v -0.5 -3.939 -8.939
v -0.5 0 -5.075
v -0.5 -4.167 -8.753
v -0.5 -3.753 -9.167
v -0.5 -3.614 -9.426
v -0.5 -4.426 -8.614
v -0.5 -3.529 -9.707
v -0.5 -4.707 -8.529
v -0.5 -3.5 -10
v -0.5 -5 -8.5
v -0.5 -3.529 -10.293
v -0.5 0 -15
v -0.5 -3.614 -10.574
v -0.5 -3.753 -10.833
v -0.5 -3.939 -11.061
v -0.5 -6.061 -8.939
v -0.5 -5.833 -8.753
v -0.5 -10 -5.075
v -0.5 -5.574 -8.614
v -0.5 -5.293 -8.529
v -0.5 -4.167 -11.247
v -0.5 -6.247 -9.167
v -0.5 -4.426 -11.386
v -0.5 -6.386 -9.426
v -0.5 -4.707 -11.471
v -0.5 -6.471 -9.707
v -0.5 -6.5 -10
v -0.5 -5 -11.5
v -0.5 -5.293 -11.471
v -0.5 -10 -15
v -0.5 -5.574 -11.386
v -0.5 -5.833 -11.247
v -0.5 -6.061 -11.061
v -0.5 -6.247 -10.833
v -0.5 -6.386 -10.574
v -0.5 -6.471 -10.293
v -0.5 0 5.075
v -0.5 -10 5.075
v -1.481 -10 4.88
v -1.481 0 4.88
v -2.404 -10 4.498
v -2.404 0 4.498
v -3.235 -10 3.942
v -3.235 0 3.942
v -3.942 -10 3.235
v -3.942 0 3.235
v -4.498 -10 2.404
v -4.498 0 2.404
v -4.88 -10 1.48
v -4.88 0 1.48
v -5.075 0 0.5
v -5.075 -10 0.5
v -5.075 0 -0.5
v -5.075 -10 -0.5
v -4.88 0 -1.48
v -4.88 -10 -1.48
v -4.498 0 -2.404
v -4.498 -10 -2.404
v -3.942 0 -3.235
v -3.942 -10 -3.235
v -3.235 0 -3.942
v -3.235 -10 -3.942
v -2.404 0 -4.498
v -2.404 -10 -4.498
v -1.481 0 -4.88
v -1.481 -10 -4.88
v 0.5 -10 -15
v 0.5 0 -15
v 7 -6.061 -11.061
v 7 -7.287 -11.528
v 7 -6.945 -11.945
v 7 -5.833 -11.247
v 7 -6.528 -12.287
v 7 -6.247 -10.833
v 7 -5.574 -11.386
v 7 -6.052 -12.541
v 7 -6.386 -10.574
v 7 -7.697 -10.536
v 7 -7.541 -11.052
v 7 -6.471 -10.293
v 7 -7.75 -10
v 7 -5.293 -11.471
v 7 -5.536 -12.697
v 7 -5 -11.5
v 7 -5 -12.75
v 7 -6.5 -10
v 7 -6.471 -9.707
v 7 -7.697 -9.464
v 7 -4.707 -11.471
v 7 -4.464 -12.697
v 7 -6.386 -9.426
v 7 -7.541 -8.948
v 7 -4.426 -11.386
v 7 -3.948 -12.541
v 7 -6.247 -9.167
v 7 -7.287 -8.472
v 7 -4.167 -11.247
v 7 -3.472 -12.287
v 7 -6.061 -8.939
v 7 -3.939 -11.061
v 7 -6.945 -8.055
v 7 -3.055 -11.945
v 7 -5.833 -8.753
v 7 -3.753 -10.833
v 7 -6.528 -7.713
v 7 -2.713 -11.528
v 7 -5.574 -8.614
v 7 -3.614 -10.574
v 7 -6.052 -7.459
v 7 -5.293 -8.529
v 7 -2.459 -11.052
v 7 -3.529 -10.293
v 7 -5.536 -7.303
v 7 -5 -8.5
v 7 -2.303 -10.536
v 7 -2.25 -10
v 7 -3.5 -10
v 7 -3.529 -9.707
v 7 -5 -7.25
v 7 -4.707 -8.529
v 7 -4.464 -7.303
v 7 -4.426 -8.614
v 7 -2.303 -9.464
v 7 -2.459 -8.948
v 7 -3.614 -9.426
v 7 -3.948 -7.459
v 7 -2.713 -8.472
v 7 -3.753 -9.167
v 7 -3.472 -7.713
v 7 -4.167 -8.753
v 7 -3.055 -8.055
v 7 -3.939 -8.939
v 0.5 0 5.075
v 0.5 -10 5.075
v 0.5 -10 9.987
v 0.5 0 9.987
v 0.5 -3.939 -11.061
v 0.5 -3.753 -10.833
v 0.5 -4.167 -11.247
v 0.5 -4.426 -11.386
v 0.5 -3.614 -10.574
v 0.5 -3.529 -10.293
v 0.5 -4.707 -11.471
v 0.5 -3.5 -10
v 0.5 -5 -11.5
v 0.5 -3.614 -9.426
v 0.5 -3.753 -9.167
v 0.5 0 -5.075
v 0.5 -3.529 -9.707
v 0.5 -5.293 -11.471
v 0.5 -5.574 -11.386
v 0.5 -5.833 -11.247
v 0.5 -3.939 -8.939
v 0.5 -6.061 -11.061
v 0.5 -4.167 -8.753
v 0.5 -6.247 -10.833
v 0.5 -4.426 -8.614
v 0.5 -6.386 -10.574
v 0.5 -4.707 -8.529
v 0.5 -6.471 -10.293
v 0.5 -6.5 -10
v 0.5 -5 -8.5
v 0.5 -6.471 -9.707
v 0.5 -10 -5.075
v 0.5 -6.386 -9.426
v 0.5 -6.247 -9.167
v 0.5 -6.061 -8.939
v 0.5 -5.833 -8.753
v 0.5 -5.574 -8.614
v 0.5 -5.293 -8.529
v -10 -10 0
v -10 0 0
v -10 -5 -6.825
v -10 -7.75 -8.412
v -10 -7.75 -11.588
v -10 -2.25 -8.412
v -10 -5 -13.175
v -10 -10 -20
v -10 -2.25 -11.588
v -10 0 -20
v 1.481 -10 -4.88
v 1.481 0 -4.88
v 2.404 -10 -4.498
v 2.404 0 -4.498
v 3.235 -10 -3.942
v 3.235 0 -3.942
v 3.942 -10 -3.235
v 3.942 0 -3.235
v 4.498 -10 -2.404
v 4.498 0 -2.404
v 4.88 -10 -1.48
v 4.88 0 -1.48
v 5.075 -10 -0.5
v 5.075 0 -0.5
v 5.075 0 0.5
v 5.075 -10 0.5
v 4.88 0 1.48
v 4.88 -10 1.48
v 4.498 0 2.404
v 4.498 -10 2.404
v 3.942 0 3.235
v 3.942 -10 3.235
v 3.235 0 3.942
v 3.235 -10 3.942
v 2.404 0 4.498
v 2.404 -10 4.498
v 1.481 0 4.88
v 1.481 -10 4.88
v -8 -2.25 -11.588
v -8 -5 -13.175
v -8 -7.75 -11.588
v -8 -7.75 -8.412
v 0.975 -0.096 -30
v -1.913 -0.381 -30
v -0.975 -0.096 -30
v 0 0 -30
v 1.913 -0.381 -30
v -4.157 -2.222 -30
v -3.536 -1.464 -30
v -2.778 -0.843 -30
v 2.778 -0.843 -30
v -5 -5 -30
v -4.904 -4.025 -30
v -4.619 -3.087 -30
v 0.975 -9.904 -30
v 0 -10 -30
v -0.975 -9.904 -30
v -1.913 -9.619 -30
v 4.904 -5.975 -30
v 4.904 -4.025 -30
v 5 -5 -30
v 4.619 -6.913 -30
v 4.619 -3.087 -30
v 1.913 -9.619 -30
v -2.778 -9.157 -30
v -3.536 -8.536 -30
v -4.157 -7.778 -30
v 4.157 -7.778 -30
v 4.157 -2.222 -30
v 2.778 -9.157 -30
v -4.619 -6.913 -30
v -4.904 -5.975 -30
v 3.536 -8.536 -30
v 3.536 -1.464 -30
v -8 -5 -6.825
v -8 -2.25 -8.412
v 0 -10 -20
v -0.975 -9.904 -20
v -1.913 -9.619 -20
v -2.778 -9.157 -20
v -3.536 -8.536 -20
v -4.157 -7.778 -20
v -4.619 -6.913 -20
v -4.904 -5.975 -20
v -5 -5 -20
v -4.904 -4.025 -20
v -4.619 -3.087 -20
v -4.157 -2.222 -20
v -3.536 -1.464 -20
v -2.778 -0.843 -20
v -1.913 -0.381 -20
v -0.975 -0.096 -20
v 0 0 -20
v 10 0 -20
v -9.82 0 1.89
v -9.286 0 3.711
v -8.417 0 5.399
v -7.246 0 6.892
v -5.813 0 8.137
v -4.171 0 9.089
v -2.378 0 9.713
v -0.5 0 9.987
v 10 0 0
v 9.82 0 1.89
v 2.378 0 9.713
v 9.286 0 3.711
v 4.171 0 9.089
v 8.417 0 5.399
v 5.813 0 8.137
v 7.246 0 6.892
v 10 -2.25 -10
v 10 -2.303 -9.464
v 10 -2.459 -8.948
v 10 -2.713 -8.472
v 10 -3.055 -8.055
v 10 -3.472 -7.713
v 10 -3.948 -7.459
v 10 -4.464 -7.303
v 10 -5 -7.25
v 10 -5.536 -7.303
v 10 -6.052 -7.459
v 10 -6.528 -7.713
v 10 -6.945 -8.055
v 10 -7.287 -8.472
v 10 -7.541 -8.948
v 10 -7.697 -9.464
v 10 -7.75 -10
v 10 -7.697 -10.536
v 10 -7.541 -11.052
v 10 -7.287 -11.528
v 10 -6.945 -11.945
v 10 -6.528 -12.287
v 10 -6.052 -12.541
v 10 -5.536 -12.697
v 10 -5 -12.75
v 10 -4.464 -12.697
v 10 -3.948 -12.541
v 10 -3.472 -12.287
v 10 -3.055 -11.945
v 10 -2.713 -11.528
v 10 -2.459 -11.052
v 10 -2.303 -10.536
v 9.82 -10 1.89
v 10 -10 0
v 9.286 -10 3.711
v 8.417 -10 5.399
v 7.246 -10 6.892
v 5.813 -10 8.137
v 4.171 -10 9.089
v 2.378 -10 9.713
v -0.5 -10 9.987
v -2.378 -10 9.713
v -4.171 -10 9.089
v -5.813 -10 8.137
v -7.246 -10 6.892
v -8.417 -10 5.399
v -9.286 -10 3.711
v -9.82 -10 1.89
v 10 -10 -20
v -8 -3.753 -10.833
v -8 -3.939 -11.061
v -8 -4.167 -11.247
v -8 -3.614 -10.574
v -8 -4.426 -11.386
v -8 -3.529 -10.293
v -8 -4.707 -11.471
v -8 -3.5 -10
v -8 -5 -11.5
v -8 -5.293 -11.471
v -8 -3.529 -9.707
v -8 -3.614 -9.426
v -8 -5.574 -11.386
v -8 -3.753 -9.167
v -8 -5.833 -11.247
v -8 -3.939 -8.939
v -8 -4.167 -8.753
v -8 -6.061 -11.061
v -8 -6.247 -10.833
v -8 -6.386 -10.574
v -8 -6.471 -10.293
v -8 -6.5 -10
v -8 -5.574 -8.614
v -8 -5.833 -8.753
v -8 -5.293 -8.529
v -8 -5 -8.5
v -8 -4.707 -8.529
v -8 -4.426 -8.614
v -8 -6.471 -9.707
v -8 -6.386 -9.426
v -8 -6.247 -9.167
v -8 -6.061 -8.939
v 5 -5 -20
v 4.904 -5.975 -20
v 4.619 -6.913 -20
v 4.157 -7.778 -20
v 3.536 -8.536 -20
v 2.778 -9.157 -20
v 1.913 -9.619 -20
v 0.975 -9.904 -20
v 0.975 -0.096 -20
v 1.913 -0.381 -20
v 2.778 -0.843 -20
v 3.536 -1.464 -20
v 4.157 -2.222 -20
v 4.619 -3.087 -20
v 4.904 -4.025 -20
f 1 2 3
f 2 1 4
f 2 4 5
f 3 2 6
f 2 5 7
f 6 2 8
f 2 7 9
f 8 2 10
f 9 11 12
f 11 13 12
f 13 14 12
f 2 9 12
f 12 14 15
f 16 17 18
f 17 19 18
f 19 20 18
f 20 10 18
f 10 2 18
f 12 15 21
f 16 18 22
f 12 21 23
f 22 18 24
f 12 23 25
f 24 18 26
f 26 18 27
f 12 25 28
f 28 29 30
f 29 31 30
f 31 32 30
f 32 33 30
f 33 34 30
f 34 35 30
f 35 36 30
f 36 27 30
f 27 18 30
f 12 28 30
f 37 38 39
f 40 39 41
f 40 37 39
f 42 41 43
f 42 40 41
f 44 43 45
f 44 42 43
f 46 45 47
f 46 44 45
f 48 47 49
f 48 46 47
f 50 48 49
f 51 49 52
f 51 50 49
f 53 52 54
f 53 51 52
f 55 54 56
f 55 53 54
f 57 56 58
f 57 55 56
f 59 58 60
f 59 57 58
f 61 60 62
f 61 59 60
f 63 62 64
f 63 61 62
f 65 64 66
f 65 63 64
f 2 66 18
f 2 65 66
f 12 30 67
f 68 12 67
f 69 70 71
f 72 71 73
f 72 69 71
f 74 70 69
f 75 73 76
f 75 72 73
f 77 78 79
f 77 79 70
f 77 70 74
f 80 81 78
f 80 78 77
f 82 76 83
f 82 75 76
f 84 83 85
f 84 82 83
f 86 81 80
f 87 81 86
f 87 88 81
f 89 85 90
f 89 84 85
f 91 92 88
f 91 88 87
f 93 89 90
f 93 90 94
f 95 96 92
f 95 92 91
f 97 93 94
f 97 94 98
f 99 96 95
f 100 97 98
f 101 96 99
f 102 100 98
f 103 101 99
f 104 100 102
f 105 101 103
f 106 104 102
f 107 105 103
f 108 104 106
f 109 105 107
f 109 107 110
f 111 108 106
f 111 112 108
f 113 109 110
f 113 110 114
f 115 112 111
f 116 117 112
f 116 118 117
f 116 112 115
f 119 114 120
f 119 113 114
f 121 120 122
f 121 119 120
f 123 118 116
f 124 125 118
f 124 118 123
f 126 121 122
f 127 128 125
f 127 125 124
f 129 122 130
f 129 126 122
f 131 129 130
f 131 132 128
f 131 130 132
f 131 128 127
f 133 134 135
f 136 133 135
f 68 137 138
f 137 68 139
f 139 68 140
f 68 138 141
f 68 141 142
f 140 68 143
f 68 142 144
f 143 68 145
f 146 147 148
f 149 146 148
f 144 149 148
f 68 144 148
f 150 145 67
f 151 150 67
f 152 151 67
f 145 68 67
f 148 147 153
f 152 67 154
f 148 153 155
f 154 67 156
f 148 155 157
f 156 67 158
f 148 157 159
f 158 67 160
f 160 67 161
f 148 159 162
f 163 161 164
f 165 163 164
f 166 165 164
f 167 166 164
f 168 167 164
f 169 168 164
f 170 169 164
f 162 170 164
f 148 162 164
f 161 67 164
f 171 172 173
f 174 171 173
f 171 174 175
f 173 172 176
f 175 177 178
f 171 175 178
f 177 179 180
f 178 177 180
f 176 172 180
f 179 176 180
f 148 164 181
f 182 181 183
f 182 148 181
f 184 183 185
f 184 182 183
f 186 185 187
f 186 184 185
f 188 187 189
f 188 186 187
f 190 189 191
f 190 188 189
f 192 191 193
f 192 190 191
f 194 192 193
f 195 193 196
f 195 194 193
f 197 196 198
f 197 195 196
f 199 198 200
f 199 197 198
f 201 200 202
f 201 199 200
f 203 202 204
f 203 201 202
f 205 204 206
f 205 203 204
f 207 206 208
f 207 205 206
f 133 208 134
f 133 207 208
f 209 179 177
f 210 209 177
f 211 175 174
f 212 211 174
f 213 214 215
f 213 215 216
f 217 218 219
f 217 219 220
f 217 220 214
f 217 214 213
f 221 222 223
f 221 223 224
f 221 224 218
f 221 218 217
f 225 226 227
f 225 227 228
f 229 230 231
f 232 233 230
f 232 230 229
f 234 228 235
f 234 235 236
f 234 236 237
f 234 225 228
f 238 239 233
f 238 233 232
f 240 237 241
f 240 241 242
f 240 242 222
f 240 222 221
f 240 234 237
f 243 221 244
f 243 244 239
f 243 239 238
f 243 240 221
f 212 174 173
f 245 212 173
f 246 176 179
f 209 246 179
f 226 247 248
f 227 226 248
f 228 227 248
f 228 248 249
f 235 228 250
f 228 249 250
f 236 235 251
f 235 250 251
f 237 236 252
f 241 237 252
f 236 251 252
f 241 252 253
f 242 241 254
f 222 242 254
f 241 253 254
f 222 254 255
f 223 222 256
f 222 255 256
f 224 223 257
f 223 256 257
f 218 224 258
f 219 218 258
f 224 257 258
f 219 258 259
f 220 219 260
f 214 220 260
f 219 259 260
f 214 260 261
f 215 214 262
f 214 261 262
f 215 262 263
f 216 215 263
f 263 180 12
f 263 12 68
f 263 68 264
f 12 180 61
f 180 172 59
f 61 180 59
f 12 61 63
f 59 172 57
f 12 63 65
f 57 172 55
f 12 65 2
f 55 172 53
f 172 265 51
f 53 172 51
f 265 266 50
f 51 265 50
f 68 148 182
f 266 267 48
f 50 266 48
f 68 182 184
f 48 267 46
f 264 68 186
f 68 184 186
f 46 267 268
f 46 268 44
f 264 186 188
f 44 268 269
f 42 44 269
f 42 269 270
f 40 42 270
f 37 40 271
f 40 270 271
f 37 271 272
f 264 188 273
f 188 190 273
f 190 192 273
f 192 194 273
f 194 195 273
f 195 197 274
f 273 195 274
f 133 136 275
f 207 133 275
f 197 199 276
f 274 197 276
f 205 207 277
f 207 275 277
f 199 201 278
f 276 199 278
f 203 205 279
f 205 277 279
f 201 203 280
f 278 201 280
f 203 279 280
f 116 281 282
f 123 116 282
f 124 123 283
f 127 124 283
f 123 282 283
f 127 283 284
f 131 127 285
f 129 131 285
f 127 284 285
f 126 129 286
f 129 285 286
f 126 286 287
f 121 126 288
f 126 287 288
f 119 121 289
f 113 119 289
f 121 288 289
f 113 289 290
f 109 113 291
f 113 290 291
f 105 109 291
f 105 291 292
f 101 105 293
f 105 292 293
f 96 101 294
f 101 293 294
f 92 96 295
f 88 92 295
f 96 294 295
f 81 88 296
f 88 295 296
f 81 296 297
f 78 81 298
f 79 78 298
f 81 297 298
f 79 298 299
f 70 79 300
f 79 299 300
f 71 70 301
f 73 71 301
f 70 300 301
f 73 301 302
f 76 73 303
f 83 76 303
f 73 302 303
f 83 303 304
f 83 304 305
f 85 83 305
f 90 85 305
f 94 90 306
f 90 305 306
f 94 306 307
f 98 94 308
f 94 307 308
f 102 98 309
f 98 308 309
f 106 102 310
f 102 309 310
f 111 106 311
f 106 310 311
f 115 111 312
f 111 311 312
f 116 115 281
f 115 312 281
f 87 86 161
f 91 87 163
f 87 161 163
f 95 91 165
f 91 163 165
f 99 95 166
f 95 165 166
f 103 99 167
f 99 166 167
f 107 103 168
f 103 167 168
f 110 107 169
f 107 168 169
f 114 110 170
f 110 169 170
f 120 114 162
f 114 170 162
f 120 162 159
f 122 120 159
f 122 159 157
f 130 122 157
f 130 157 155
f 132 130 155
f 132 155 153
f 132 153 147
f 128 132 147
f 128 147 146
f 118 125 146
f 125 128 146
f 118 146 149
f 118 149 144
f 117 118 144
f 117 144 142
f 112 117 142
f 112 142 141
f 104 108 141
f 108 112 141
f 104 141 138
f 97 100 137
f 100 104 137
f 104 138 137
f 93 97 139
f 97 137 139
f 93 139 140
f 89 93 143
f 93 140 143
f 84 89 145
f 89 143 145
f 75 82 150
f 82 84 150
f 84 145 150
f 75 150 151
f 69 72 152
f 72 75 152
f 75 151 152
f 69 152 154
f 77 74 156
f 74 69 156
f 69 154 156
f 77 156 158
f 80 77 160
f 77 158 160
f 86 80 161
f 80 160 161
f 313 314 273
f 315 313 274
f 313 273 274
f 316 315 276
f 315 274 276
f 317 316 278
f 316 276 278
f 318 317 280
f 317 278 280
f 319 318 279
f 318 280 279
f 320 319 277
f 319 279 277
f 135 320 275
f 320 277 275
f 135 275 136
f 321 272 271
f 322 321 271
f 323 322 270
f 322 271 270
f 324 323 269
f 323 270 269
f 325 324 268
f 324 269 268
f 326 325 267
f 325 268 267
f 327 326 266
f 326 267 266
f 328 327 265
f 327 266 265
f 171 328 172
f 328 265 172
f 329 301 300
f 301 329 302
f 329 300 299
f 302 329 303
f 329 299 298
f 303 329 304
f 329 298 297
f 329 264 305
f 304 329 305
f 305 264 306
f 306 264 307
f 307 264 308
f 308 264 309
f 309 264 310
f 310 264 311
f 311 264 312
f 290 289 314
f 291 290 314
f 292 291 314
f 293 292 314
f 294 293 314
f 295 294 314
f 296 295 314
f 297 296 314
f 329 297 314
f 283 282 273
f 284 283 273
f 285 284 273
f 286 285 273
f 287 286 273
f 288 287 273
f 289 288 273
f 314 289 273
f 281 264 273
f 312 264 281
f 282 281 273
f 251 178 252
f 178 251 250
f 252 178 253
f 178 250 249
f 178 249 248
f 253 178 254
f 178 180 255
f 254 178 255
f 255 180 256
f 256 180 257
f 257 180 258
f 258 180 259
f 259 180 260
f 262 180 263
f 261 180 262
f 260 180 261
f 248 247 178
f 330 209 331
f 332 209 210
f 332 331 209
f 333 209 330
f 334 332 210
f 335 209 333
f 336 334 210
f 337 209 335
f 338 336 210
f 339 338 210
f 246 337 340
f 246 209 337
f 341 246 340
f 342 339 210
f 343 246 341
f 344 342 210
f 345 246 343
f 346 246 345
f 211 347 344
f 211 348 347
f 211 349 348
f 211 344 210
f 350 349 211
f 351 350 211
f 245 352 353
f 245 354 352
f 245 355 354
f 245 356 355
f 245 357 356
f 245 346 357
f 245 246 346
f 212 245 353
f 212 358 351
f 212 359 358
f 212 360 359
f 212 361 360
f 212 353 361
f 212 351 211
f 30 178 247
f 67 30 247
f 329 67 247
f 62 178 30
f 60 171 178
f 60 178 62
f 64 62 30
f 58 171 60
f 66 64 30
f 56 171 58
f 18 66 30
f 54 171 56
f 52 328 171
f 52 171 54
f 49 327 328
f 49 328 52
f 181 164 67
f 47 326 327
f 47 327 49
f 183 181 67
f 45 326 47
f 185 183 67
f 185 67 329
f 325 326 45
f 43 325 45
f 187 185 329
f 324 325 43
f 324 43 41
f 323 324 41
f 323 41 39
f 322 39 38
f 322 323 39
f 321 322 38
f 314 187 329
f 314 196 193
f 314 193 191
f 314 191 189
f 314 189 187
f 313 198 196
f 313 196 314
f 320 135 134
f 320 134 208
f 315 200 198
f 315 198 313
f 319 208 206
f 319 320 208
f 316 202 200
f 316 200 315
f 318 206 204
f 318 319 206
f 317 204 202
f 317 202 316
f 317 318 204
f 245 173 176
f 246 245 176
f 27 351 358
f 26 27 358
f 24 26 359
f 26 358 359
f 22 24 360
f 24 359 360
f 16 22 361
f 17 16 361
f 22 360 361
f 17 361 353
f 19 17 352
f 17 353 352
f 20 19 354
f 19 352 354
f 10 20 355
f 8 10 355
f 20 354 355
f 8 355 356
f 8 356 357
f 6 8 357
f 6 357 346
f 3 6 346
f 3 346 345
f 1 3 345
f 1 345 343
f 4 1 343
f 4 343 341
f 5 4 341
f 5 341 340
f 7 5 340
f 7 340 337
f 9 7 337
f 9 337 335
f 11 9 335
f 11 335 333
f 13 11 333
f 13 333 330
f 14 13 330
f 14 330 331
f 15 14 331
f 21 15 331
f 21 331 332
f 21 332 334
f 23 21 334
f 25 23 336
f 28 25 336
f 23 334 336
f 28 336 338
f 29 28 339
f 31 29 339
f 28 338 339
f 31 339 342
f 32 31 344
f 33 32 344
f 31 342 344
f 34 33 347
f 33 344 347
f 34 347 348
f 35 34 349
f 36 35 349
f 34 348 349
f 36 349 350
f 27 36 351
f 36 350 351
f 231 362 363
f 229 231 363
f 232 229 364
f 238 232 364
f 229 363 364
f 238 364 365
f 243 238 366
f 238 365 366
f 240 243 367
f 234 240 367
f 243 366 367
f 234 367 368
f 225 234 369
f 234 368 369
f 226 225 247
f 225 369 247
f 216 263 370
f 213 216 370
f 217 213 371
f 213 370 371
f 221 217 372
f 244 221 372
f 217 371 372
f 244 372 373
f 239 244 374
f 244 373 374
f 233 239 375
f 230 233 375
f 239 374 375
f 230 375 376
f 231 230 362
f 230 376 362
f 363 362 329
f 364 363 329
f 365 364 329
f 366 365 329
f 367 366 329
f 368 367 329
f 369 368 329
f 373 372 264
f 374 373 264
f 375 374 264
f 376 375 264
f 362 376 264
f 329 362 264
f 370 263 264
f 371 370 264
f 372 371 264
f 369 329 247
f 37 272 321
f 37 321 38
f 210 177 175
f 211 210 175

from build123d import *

# Parameters (mm, degrees)
F0_R      = 5.1
F1_DEPTH  = 10
F2_R      = 1.5
F3_DEPTH  = 25
F5_DEPTH  = 25
F7_DEPTH  = 10
F8_R      = 2.75
F8_R_2    = 1.5
F9_DEPTH  = 3
F10_R     = 1.5
F11_DEPTH = 2


with BuildPart() as f1:
    # F0 (on Front) → F1 (new body)
    with BuildSketch(Plane.XZ):
        with BuildLine():
            ThreePointArc((-10, 0), (0, -10), (10, 0))
            ThreePointArc((10, 0), (0, 10), (-10, 0))
        make_face()
        Circle(F0_R, mode=Mode.SUBTRACT)
        with BuildLine():
            Line((10, -20), (10, 0))
            ThreePointArc((10, 0), (0, -10), (-10, 0))
            Line((-10, 0), (-10, -20))
            Line((-10, -20), (10, -20))
        make_face()
    extrude(amount=F1_DEPTH)

    # F2 (on face) → F3 (cut)
    with BuildSketch(Plane(origin=(-10, 0, 0), x_dir=(0, -1, 0), z_dir=(-1, 0, 0))):
        with Locations((5, -10)):
            Circle(F2_R)
    extrude(amount=-F3_DEPTH, mode=Mode.SUBTRACT)

    # F4 (on face) → F5 (cut)
    with BuildSketch(Plane.XZ.offset(10)):
        with BuildLine():
            Line((0.5, 12.5812012702), (-0.5, 12.5812012702))
            Line((-0.5, 12.5812012702), (-0.5, 9.9874921777))
            ThreePointArc((-0.5, 9.9874921777), (0, 10), (0.5, 9.9874921777))
            Line((0.5, 9.9874921777), (0.5, 12.5812012702))
        make_face()
        with BuildLine():
            ThreePointArc((0.5, 9.9874921777), (0, 10), (-0.5, 9.9874921777))
            Line((-0.5, 9.9874921777), (-0.5, 5.0754310162))
            ThreePointArc((-0.5, 5.0754310162), (0, 5.1), (0.5, 5.0754310162))
            Line((0.5, 5.0754310162), (0.5, 9.9874921777))
        make_face()
        with BuildLine():
            ThreePointArc((0.5, -5.0754310162), (0, -5.1), (-0.5, -5.0754310162))
            Line((-0.5, -5.0754310162), (-0.5, -15))
            Line((-0.5, -15), (0.5, -15))
            Line((0.5, -15), (0.5, -5.0754310162))
        make_face()
        with BuildLine():
            ThreePointArc((0.5, 5.0754310162), (0, 5.1), (-0.5, 5.0754310162))
            Line((-0.5, 5.0754310162), (-0.5, -5.0754310162))
            ThreePointArc((-0.5, -5.0754310162), (0, -5.1), (0.5, -5.0754310162))
            Line((0.5, -5.0754310162), (0.5, 5.0754310162))
        make_face()
    extrude(amount=-F5_DEPTH, mode=Mode.SUBTRACT)

    # F6 (on face) → F7 (join)
    with BuildSketch(Plane(origin=(0, 0, -20), x_dir=(1, 0, 0), z_dir=(0, 0, -1))):
        with BuildLine():
            ThreePointArc((0, 0), (3.5355339059, 1.4644660941), (5, 5))
            ThreePointArc((5, 5), (3.5355339059, 8.5355339059), (0, 10))
            ThreePointArc((0, 10), (-5, 5), (0, 0))
        make_face()
    extrude(amount=F7_DEPTH)

    # F8 (on face) → F9 (cut)
    with BuildSketch(Plane.YZ.offset(10)):
        with Locations((-5, -10)):
            Circle(F8_R)
        with Locations((-5, -10)):
            Circle(F8_R_2, mode=Mode.SUBTRACT)
    extrude(amount=-F9_DEPTH, mode=Mode.SUBTRACT)

    # F10 (on face) → F11 (cut)
    with BuildSketch(Plane(origin=(-10, 0, 0), x_dir=(0, -1, 0), z_dir=(-1, 0, 0))):
        Polygon((7.75, -11.5877132403), (7.75, -8.4122867597), (5, -6.8245735195), (2.25, -8.4122867597), (2.25, -11.5877132403), (5, -13.1754264805), align=None)
        with Locations((5, -10)):
            Circle(F10_R, mode=Mode.SUBTRACT)
    extrude(amount=-F11_DEPTH, mode=Mode.SUBTRACT)


solid = f1.part
